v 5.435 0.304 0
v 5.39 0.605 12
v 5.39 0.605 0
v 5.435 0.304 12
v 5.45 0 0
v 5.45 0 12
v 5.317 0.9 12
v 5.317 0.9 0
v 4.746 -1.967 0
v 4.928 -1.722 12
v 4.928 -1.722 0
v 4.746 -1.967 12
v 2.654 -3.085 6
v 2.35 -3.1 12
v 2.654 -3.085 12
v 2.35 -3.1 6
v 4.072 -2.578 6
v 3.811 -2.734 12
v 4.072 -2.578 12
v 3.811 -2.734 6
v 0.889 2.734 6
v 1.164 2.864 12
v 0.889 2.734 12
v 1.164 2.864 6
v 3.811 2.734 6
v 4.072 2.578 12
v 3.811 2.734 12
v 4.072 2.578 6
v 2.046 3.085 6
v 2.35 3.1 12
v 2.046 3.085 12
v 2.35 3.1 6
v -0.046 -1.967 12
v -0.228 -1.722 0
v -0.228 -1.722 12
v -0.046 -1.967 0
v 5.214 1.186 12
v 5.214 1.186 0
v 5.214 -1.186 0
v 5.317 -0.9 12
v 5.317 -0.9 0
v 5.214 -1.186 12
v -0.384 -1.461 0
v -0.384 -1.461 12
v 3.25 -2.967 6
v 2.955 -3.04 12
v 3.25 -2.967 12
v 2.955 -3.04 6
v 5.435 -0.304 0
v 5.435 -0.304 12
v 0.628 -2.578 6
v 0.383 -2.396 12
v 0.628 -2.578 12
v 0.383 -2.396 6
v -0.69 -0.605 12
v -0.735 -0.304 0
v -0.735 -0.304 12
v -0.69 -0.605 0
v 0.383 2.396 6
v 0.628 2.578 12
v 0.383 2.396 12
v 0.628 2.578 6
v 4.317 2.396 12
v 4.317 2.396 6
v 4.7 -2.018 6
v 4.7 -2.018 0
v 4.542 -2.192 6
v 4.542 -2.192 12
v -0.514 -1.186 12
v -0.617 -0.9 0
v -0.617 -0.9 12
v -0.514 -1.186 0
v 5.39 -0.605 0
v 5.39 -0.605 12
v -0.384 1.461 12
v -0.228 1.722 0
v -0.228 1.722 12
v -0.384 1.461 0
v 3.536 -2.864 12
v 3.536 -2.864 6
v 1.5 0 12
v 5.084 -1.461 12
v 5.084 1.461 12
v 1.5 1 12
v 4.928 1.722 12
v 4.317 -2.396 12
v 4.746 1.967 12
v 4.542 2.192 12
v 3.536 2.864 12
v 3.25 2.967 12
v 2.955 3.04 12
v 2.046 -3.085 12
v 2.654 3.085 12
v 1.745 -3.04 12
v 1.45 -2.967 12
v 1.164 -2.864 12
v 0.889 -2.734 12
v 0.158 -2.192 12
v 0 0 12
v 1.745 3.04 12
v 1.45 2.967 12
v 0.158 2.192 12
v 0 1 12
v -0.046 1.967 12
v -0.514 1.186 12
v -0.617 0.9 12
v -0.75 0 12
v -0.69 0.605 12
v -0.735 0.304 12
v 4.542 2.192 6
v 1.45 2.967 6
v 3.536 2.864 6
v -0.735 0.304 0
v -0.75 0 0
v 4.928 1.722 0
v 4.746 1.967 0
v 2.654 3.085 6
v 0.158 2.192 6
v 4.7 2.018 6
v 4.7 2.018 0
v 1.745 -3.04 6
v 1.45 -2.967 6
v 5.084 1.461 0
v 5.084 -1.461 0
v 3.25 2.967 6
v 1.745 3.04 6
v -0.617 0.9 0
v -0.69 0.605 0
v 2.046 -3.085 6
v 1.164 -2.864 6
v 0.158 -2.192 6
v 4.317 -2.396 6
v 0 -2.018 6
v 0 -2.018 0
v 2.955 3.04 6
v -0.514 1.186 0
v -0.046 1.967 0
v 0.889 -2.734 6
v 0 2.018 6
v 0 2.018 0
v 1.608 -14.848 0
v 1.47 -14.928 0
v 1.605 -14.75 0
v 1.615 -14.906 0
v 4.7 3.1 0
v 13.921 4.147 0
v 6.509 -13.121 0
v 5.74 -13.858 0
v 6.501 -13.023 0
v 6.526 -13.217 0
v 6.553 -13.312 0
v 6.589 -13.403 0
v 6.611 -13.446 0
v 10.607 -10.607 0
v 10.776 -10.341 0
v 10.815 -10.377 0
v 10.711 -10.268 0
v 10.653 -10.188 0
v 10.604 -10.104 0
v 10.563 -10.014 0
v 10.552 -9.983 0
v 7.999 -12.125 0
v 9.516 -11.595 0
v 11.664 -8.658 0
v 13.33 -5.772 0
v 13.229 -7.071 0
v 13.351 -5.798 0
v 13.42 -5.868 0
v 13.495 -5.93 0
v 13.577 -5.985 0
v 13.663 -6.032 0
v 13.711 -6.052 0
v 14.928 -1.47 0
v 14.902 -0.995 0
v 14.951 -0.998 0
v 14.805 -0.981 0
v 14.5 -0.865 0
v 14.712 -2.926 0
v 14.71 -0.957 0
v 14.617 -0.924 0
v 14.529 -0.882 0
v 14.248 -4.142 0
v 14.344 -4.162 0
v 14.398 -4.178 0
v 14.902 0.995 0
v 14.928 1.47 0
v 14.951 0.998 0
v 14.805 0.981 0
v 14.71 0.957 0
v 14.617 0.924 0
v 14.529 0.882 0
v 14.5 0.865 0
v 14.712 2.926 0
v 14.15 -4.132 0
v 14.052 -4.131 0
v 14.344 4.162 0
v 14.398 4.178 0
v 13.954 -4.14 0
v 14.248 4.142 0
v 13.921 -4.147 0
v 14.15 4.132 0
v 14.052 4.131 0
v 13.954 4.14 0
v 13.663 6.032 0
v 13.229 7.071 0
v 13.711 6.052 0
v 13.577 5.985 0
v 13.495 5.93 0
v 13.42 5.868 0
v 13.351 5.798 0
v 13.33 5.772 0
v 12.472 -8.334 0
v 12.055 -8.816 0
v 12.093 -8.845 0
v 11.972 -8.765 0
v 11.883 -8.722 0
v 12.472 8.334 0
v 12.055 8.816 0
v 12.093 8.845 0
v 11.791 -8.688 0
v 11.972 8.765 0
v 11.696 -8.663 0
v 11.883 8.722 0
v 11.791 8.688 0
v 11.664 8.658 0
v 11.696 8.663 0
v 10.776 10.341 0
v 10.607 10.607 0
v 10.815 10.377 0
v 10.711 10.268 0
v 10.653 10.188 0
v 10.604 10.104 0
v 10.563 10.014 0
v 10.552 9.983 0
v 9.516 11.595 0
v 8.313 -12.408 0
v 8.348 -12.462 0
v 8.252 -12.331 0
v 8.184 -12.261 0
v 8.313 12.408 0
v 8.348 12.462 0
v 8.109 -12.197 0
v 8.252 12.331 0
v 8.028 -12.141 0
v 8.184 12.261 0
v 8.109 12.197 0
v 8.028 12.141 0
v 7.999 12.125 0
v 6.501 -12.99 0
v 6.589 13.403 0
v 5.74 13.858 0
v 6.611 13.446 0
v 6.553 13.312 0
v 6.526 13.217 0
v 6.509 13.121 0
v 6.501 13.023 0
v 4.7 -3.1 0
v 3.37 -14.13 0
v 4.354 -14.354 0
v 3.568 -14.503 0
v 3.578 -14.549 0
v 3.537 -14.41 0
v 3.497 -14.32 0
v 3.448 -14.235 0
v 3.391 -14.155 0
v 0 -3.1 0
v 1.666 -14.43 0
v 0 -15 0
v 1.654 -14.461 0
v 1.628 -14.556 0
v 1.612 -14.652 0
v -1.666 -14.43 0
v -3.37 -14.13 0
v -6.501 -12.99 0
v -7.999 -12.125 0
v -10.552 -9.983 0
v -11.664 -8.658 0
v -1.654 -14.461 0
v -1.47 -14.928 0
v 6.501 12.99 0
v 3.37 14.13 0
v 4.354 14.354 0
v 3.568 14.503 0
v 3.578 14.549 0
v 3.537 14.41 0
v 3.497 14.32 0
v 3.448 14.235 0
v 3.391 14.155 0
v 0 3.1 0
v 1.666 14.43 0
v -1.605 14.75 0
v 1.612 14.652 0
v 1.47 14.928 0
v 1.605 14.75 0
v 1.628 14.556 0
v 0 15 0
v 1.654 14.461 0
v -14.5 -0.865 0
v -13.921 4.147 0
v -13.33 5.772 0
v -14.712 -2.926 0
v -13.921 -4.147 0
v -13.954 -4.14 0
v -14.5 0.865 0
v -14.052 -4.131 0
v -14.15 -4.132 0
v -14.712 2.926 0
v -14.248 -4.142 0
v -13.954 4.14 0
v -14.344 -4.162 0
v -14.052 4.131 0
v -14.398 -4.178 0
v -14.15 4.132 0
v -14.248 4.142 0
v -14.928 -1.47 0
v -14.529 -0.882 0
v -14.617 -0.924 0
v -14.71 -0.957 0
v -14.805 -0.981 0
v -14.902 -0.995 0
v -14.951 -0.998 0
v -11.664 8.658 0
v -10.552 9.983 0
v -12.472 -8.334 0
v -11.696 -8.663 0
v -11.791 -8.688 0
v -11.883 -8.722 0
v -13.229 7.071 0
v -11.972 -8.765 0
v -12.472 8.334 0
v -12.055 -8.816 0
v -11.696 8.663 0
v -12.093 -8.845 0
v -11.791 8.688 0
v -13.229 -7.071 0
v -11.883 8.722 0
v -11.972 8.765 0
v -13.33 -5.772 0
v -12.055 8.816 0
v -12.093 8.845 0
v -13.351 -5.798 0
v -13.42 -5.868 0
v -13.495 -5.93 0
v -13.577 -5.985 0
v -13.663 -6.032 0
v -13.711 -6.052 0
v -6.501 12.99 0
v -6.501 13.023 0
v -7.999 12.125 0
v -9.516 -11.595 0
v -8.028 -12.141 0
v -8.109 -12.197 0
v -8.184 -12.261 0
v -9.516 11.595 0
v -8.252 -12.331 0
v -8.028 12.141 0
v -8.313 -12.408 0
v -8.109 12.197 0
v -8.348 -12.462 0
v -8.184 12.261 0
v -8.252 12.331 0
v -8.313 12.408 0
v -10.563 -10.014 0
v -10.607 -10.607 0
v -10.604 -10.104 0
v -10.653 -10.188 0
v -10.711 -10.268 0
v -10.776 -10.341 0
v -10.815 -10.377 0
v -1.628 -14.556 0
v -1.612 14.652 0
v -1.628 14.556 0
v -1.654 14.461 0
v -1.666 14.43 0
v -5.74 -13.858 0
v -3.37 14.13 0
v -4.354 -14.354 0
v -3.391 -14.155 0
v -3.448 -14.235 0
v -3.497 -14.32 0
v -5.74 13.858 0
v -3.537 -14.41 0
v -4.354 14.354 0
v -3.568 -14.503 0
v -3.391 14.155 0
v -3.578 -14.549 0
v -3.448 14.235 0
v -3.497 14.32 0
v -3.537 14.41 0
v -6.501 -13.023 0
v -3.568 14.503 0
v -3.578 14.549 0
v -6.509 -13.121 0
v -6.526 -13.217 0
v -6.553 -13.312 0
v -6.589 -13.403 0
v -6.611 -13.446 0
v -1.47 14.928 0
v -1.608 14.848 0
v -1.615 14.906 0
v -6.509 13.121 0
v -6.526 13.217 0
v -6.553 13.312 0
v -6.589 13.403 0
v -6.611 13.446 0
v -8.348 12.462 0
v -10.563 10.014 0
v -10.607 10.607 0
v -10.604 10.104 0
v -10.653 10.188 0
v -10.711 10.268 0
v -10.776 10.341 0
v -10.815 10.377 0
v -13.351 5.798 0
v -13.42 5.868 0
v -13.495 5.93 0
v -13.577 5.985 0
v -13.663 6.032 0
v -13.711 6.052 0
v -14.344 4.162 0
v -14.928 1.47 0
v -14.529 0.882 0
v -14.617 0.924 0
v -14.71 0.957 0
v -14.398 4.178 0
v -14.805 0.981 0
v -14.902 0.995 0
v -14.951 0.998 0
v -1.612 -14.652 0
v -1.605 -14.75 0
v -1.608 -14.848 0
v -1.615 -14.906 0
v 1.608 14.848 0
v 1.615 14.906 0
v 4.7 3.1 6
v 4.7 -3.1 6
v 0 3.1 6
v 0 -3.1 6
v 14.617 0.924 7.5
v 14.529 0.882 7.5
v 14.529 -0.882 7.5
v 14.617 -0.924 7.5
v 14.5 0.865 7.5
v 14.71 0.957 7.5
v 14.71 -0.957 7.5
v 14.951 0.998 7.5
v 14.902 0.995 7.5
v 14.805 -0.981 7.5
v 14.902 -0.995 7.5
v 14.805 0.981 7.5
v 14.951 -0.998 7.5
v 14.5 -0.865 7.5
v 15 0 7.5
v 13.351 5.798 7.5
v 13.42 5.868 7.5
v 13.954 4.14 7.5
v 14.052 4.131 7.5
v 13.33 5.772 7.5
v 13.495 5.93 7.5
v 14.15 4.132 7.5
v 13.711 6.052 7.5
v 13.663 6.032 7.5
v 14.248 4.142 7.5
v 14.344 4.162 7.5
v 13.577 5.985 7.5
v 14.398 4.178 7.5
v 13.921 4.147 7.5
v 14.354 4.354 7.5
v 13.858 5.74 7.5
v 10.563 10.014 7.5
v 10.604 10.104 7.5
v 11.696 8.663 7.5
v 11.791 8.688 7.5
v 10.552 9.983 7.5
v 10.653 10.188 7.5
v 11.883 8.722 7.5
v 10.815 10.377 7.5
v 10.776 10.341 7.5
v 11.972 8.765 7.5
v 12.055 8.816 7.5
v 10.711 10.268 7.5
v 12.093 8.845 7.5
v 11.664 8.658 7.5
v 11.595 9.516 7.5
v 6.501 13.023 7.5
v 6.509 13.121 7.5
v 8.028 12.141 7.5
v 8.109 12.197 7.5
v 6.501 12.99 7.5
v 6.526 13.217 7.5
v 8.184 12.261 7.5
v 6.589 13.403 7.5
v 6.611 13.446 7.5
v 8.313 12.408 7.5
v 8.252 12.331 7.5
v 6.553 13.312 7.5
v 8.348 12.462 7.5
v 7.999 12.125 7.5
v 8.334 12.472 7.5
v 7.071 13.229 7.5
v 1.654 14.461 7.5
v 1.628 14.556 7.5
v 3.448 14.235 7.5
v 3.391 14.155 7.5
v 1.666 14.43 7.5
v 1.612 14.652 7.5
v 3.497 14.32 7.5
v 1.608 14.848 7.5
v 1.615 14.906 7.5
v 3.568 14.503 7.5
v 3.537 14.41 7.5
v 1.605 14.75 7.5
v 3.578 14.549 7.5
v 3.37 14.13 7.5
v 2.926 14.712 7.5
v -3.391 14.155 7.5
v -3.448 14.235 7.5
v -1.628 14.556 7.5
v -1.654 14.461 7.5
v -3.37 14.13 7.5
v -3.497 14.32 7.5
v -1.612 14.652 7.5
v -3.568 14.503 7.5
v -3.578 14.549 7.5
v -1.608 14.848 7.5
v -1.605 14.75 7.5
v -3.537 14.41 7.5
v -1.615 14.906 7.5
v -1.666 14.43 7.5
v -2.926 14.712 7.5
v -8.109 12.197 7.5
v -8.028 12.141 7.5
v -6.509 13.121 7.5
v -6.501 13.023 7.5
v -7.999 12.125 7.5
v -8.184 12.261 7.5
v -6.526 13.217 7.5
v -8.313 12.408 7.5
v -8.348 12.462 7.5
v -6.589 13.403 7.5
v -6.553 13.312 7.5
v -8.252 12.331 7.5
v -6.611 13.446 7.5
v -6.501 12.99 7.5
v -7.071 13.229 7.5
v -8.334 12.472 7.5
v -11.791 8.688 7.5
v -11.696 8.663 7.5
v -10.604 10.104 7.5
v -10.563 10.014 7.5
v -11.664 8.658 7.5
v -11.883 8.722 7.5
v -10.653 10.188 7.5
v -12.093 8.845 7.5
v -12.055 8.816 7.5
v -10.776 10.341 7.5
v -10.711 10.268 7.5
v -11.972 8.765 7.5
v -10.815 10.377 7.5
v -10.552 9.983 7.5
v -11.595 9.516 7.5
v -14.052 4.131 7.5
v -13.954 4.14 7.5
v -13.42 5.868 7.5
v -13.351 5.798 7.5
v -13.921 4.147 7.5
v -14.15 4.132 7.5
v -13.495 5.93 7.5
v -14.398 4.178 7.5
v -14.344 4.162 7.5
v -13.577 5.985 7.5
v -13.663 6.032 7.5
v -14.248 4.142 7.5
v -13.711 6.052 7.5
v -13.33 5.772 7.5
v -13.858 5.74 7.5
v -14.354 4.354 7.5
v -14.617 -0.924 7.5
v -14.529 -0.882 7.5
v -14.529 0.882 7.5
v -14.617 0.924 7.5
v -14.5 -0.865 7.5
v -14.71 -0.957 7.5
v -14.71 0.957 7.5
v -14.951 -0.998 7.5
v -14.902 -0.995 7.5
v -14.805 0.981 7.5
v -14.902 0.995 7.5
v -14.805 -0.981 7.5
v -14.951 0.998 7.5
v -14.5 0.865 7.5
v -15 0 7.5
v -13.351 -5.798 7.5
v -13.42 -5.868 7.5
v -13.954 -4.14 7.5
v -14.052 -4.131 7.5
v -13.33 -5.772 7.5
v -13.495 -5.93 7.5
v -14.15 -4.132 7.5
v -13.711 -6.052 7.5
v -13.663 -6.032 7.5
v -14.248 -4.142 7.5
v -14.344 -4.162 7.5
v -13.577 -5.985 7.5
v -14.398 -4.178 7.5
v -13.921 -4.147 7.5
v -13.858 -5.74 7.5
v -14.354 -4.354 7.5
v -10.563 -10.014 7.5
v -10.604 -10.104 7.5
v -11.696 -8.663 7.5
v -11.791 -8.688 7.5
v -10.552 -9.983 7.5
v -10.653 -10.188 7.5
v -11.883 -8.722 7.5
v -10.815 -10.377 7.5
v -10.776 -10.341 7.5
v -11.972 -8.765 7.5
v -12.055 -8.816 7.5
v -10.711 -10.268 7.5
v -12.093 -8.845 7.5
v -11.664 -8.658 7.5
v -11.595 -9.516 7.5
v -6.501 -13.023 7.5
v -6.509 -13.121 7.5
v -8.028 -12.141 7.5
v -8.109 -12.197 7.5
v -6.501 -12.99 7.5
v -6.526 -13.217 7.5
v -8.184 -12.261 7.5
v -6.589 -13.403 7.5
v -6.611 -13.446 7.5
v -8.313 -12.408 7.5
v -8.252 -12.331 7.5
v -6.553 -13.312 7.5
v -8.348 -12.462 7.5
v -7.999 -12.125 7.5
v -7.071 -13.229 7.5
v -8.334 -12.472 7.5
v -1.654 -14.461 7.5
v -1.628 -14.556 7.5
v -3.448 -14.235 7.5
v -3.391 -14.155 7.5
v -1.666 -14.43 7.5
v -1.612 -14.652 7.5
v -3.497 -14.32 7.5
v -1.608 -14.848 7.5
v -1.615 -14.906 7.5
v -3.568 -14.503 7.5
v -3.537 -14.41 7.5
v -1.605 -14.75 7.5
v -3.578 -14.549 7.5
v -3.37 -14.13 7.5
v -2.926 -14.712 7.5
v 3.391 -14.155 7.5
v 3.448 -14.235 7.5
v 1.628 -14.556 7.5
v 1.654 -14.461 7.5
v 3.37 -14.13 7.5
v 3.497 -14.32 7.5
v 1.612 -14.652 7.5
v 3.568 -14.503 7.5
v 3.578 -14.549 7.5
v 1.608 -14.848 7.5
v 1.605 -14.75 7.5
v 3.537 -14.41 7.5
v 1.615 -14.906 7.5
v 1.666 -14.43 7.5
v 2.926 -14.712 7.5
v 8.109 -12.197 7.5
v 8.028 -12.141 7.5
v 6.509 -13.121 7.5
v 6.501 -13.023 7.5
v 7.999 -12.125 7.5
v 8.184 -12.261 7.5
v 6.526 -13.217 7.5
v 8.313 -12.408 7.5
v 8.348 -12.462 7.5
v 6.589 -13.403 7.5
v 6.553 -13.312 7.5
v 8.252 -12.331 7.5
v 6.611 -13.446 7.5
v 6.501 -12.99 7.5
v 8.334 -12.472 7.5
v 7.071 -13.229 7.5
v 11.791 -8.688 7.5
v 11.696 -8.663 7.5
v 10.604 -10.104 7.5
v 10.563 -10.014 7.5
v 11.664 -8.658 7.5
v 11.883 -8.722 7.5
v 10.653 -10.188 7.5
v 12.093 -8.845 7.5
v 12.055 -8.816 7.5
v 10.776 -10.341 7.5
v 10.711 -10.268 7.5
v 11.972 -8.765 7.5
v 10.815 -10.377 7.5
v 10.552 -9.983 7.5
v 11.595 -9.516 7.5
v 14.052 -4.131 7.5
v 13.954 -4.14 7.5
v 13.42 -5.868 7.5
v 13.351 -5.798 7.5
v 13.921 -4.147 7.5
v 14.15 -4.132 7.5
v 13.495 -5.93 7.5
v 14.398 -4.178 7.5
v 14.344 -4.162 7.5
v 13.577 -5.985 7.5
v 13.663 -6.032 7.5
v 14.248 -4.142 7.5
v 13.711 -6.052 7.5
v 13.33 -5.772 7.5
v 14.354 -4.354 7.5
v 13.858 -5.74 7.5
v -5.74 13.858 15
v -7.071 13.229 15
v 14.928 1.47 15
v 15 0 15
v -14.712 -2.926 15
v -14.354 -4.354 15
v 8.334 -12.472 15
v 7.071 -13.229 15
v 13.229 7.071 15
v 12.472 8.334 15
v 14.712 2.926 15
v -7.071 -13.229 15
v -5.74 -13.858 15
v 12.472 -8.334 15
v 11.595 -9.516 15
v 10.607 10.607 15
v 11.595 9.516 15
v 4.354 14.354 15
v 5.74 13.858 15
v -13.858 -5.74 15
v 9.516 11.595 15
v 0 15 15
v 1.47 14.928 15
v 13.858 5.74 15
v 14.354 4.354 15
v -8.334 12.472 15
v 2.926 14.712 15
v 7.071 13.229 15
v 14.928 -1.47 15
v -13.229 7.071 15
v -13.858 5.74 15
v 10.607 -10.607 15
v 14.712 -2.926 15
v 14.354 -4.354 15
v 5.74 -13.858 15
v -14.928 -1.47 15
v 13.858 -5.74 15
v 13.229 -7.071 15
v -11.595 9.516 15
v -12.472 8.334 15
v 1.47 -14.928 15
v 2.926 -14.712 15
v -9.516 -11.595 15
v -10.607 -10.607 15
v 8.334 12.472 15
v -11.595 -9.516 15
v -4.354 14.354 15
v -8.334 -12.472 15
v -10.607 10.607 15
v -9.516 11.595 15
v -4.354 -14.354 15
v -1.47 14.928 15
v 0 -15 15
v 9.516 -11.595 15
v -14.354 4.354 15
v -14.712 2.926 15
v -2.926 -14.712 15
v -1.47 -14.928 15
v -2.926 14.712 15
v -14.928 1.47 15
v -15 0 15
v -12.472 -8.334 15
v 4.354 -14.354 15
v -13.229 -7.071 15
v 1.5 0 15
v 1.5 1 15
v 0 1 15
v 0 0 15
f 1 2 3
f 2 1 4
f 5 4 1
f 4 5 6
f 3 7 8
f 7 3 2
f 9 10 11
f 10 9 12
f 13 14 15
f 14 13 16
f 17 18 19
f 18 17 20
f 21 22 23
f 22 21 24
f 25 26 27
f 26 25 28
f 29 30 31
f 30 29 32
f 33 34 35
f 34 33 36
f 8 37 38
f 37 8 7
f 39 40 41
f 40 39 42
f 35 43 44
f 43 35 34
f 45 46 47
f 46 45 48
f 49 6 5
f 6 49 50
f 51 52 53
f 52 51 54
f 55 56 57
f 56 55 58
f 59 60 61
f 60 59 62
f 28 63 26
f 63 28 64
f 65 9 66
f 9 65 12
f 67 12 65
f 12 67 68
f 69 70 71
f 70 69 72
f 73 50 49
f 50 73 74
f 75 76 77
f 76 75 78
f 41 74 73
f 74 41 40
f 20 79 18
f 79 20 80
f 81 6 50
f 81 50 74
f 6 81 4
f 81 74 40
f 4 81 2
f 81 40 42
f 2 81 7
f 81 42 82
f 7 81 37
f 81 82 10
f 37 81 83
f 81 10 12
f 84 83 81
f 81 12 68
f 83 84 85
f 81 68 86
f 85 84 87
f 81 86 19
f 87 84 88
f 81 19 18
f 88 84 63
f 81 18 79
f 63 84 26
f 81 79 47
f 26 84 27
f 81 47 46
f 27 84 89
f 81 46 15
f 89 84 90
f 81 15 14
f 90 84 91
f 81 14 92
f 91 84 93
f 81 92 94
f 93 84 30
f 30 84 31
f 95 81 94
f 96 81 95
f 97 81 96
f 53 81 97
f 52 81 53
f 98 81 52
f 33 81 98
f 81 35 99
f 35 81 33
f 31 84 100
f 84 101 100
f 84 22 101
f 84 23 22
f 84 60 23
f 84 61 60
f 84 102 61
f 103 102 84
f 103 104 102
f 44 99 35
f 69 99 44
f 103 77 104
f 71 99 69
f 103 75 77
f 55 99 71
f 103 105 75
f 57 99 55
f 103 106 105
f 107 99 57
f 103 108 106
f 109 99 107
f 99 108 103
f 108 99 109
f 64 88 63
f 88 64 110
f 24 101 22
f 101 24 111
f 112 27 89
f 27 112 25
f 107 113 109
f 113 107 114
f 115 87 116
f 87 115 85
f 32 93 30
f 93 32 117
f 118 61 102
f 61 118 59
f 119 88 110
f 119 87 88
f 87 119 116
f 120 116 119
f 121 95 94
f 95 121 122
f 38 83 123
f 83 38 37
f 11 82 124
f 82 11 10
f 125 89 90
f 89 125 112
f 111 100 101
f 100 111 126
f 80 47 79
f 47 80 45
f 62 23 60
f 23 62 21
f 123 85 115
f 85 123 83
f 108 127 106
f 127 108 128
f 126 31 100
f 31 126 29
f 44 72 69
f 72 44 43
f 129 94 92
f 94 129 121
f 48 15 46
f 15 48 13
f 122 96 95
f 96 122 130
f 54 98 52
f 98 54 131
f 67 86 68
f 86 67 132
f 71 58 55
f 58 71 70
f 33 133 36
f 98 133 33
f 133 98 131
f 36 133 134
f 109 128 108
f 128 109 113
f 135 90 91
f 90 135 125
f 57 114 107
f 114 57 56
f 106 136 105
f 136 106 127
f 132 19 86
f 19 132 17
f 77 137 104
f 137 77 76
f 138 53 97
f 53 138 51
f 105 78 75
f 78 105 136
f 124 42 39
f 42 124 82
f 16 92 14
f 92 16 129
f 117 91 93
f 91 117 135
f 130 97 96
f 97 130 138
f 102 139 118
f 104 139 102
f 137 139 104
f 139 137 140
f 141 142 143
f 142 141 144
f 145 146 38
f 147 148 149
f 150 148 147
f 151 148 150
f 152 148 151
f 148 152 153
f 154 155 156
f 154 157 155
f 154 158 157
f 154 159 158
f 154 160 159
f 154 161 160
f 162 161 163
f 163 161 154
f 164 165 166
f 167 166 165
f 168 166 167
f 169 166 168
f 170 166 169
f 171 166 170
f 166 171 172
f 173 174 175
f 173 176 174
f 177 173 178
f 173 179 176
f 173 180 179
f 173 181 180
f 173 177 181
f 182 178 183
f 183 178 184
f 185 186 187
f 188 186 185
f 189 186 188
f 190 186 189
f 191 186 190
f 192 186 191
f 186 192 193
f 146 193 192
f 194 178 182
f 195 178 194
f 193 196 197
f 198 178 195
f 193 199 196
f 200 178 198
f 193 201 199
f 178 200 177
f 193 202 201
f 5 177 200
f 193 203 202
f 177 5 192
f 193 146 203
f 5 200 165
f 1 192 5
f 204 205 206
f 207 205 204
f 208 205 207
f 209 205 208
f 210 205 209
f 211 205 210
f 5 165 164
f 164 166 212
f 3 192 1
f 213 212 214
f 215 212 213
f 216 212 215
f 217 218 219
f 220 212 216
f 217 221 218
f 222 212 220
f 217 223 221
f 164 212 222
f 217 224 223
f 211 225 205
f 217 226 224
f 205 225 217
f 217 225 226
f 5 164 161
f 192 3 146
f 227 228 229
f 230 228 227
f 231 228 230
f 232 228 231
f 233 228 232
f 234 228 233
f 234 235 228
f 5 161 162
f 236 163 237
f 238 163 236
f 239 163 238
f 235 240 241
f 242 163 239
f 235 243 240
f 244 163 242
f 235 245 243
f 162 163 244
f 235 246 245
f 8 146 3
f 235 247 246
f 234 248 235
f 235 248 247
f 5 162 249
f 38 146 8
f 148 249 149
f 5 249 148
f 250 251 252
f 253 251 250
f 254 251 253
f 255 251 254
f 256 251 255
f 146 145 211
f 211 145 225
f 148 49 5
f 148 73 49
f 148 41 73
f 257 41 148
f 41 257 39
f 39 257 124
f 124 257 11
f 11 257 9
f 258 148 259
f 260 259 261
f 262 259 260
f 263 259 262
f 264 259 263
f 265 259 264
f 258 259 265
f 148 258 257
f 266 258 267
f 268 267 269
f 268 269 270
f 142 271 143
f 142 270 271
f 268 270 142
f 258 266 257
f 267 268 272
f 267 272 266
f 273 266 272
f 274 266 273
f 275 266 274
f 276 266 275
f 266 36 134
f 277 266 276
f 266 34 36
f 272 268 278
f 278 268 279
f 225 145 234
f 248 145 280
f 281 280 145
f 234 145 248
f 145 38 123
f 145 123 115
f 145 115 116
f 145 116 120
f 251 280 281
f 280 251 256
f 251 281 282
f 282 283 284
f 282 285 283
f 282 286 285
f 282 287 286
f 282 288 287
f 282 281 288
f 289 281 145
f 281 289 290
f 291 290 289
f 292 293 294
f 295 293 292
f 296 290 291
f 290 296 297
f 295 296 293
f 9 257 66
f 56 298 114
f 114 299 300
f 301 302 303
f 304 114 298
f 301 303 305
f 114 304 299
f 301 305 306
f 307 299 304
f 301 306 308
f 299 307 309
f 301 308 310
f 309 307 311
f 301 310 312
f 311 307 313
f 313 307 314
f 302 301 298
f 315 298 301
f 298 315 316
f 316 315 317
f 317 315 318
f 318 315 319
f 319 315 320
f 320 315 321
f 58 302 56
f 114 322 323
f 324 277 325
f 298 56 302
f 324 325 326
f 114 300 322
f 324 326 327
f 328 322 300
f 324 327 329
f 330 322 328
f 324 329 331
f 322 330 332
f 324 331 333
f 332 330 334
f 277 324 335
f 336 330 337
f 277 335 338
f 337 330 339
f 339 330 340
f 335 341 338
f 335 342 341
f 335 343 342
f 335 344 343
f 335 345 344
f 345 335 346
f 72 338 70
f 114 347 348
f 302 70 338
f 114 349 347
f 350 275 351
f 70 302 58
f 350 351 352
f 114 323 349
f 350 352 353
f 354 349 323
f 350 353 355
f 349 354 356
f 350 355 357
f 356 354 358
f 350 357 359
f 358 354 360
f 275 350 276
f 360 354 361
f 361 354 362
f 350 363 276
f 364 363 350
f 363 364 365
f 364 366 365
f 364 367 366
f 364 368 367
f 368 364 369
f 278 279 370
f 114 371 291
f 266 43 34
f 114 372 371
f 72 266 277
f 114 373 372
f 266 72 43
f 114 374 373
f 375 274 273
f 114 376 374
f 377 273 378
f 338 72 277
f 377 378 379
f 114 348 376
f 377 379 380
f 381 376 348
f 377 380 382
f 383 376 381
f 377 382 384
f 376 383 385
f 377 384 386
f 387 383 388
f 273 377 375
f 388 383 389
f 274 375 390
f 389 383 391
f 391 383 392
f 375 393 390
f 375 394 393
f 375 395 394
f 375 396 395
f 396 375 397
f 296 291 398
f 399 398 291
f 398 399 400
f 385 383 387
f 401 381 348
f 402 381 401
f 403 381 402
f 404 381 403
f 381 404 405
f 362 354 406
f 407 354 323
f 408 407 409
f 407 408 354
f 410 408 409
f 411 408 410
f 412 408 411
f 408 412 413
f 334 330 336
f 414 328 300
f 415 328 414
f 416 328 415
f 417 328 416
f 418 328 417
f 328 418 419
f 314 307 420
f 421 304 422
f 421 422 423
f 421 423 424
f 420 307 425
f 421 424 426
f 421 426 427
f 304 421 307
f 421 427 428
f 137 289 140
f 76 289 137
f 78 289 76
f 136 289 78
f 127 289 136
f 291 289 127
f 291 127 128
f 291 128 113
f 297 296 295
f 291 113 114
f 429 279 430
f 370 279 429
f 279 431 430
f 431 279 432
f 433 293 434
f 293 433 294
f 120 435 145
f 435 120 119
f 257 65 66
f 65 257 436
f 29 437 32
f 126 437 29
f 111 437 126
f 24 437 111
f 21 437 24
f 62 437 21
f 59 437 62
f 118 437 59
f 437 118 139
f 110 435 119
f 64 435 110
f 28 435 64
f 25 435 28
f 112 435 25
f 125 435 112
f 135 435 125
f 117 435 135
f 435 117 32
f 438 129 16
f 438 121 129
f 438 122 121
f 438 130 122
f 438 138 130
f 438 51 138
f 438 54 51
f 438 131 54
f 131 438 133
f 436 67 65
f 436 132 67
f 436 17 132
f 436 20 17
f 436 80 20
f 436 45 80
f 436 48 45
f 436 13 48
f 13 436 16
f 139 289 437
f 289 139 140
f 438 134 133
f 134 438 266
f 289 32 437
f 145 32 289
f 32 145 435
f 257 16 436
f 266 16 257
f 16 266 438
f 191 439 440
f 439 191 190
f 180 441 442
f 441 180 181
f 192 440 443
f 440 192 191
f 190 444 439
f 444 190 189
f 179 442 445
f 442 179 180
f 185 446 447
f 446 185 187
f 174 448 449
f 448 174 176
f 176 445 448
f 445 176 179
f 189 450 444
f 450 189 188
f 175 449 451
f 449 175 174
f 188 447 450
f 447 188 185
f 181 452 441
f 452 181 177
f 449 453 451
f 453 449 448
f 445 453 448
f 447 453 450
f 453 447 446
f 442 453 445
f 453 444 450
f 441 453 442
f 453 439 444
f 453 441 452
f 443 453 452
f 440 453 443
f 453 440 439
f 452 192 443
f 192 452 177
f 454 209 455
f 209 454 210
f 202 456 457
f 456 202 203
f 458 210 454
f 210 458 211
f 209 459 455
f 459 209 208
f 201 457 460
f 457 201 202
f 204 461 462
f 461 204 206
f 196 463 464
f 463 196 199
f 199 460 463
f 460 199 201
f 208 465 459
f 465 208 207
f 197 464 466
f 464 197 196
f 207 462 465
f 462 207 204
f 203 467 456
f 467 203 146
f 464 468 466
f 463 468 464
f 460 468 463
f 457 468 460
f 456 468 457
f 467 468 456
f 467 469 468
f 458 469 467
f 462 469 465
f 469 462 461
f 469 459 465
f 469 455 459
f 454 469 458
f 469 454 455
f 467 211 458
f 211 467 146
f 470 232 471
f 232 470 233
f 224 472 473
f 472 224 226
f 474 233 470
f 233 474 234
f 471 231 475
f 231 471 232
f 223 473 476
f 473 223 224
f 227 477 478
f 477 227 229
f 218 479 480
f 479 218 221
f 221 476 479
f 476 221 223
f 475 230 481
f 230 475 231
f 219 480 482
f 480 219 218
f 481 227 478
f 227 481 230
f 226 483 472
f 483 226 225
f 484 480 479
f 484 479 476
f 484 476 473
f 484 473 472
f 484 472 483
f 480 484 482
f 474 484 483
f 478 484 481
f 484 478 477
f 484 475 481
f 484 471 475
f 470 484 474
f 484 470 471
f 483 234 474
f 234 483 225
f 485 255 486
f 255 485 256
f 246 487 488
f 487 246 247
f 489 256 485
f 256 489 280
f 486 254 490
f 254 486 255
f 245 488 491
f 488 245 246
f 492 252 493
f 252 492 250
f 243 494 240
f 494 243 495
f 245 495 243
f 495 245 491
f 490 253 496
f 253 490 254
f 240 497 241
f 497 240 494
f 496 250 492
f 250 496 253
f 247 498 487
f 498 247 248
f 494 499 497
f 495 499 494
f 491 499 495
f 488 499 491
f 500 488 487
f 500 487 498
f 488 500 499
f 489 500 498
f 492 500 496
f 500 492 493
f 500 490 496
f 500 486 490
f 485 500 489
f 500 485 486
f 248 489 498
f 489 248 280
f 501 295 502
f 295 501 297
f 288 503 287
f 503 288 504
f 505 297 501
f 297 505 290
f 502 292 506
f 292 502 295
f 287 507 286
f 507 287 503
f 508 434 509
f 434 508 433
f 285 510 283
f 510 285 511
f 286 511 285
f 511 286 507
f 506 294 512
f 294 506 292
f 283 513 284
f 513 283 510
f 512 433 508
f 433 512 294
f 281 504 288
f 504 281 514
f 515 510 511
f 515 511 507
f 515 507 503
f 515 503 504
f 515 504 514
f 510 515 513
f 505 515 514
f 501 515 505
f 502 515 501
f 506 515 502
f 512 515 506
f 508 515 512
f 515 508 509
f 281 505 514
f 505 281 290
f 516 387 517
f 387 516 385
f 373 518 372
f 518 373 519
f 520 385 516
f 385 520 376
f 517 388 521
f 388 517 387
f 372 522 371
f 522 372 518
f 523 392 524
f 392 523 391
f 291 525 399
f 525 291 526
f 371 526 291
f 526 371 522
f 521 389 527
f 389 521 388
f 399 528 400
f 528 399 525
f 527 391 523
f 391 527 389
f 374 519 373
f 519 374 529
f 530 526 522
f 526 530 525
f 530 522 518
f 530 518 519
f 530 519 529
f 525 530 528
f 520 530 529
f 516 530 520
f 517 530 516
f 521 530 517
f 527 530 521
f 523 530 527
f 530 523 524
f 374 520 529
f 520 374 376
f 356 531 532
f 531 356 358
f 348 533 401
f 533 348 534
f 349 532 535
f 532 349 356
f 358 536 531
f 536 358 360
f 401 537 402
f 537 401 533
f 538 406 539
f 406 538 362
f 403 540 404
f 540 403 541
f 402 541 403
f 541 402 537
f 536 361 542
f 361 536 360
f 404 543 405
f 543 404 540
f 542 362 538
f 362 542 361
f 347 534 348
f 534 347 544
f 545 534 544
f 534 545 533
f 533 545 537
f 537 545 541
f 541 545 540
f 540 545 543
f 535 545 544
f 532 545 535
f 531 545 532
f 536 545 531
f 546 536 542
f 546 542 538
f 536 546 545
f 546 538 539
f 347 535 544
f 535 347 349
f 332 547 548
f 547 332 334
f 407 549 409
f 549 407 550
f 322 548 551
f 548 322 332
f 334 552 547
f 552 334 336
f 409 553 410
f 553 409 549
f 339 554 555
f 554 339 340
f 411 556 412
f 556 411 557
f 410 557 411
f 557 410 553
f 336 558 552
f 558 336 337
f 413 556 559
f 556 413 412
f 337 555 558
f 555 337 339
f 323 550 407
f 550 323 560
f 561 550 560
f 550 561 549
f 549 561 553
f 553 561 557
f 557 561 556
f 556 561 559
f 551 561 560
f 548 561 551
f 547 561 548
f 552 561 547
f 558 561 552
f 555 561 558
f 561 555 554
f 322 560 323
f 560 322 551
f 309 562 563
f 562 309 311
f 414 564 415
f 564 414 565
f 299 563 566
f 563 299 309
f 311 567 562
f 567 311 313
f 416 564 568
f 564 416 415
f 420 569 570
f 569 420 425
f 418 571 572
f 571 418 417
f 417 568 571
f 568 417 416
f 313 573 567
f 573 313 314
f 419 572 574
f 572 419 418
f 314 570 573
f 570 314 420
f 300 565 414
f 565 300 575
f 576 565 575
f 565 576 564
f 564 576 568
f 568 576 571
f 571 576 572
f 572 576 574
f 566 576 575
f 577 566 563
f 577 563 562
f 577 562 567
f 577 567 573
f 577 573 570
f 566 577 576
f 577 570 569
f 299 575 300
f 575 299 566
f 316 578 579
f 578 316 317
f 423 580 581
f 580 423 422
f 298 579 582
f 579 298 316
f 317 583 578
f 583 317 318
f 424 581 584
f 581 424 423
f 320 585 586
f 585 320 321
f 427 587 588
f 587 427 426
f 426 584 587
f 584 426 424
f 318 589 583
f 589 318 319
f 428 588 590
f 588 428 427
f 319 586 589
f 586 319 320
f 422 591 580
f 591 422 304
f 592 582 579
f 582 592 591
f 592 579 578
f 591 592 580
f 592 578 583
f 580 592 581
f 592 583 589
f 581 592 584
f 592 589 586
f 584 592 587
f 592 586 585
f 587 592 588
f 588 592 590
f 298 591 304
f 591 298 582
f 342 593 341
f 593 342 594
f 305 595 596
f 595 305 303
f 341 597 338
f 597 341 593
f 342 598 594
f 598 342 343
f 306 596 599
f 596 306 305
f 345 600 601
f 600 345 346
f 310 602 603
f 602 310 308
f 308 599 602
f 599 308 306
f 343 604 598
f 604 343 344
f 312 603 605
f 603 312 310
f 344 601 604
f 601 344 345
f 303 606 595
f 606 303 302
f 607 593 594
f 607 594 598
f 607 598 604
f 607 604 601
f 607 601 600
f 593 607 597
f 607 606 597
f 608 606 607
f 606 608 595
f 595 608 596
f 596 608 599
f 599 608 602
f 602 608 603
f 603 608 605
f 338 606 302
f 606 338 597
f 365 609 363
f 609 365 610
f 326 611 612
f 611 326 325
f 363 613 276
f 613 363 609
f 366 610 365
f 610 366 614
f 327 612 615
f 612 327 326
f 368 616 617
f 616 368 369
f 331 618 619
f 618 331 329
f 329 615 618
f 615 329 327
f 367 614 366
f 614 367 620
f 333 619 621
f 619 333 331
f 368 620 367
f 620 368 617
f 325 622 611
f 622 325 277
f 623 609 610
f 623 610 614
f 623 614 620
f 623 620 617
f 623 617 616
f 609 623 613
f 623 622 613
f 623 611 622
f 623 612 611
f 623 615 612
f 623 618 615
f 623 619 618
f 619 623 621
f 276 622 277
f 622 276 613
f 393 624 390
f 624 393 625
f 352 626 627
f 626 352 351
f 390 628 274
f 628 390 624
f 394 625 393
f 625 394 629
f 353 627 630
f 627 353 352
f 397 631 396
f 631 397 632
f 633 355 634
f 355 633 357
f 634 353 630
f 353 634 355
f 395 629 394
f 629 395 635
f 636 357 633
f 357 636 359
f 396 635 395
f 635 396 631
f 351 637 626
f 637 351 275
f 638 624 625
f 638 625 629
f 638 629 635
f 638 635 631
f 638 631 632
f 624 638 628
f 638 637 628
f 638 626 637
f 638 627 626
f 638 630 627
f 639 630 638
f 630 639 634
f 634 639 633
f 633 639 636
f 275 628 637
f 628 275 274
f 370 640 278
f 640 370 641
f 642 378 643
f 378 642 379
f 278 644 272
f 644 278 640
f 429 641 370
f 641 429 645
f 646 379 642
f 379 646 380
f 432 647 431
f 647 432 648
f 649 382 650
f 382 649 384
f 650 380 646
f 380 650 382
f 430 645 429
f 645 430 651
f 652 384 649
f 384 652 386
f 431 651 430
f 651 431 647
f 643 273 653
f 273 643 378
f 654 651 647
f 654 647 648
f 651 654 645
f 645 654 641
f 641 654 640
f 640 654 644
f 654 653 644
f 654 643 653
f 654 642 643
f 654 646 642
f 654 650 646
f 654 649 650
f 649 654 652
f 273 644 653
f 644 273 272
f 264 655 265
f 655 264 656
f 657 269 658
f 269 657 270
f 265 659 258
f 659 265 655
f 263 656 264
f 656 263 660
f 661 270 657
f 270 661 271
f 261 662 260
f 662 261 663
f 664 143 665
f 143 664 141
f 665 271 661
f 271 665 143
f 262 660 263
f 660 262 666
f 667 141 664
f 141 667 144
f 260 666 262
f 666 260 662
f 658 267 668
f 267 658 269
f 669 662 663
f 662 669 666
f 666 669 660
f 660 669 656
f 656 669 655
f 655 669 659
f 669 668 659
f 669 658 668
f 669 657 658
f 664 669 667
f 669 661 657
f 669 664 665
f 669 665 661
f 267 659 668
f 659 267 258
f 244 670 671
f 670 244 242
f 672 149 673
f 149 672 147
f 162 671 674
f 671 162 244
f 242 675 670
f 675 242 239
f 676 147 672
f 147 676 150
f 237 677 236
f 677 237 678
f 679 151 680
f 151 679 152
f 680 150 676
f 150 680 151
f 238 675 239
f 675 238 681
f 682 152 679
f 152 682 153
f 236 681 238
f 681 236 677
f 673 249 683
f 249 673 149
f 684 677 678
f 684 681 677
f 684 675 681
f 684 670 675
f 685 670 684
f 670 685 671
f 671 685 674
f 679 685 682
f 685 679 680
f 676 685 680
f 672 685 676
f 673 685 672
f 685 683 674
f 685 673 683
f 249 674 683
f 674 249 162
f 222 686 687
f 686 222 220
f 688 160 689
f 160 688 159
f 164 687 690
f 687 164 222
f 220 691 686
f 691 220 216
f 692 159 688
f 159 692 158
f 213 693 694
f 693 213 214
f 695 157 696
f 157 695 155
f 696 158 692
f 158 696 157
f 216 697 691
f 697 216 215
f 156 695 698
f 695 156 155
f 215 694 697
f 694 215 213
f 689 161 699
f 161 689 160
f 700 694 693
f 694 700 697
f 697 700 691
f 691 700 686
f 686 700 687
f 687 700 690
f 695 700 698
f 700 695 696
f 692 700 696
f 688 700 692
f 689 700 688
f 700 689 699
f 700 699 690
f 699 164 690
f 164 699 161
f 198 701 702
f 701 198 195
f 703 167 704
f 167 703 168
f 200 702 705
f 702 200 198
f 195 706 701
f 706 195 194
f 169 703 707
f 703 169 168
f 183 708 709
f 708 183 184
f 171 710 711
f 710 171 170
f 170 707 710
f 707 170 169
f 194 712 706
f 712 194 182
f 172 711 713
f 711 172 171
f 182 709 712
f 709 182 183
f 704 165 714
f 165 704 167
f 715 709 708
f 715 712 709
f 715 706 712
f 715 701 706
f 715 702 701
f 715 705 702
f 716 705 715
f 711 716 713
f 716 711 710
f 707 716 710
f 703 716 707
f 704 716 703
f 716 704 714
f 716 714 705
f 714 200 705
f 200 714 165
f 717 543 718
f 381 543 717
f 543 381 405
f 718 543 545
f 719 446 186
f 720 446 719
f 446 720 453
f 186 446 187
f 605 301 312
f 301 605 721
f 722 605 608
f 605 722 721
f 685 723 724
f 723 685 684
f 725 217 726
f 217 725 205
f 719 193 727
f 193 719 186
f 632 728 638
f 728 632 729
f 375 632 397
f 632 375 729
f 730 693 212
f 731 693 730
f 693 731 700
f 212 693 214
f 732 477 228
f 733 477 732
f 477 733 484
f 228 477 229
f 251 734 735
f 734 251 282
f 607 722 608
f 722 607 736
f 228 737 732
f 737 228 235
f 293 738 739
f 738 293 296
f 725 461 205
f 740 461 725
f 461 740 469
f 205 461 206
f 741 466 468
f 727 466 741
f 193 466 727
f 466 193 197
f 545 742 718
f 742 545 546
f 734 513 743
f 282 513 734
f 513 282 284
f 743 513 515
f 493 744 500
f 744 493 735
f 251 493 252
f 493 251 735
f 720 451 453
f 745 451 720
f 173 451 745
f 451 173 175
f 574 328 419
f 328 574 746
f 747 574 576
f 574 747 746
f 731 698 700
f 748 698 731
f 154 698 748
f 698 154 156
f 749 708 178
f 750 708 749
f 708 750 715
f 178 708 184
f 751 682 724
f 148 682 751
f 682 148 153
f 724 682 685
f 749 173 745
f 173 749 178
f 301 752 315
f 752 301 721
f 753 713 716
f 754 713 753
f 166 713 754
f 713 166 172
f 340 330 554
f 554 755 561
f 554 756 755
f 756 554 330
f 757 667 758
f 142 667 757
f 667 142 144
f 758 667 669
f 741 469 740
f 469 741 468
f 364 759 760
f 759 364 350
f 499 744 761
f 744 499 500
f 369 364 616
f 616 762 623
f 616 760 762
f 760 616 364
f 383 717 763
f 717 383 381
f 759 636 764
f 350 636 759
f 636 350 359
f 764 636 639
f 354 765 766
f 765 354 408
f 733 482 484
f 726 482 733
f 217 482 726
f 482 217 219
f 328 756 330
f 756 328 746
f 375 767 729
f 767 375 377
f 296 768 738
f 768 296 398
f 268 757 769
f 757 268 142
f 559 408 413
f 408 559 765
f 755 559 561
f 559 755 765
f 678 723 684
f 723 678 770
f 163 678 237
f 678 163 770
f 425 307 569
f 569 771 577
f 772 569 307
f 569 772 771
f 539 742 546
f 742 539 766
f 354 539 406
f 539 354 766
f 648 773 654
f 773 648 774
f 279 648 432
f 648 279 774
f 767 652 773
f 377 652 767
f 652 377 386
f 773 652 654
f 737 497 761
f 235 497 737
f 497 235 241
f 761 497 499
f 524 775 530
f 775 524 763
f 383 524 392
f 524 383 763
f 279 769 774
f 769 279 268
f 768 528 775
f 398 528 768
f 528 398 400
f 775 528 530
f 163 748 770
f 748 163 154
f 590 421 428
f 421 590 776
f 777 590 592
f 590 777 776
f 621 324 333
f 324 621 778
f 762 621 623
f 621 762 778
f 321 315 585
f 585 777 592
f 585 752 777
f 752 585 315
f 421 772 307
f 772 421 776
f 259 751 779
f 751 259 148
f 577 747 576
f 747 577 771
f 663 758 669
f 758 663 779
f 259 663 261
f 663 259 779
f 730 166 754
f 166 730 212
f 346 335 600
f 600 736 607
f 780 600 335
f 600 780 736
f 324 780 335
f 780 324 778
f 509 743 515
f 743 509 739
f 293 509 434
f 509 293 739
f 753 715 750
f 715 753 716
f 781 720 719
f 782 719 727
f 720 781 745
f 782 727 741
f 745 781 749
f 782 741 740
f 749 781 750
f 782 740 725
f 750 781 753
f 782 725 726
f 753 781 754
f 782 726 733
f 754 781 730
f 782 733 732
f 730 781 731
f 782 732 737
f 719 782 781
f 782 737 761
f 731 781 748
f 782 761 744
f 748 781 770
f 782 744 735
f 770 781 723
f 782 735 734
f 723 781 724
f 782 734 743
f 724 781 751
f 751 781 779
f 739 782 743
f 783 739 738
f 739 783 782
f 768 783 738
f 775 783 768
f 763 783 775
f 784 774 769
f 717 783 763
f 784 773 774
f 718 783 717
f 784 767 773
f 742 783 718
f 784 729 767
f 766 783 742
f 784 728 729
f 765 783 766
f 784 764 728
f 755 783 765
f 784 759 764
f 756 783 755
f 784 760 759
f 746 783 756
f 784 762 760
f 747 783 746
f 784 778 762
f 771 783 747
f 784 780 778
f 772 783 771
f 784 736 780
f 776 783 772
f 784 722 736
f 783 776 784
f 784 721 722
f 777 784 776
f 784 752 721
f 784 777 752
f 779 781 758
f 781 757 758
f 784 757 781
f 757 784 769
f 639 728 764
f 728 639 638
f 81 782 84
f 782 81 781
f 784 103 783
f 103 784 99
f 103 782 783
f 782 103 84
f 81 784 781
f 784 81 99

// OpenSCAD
// Knob Dimensions
knob_diameter = 30;
knob_height = 15;
shaft_diameter = 6.2;
shaft_flat_width = 4.7;
shaft_depth = 12;
groove_diameter = 2;
groove_count = 18;
pointer_width = 1.5;
pointer_depth = 1;
$fn = 64;

difference() {
    // Main Body
    cylinder(d = knob_diameter, h = knob_height, center = false, $fn = $fn);

    // D-Bore
    // Shape: Cylinder + Box to create the flat side
    // The flat is on the same side as the pointer groove (Right side, positive X)
    translate([shaft_flat_width / 2, 0, 0]) {
        cylinder(d = shaft_diameter, h = shaft_depth, $fn = $fn);
        cube([shaft_flat_width, shaft_diameter, shaft_depth], center = true);
    }

    // Grip Grooves
    for (i = [0 : groove_count - 1]) {
        rotate([0, 0, i * (360 / groove_count)]) {
            // Half cylinder centered on outer surface
            // Surface is at 15. Groove radius is 1. Center of groove is 14.
            // We place a full cylinder at 15, then cut it in half.
            translate([15, 0, 0]) {
                intersection() {
                    cylinder(d = groove_diameter, h = knob_height, $fn = $fn);
                    cube([1, groove_diameter, knob_height], center = true);
                }
            }
        }
    }

    // Pointer Groove
    // 1.5 wide, 1 deep, 15 tall. Center to edge. Same side as D-bore (Right).
    translate([0, 0, 0]) {
        cube([pointer_width, pointer_depth, knob_height], center = false);
    }
}
